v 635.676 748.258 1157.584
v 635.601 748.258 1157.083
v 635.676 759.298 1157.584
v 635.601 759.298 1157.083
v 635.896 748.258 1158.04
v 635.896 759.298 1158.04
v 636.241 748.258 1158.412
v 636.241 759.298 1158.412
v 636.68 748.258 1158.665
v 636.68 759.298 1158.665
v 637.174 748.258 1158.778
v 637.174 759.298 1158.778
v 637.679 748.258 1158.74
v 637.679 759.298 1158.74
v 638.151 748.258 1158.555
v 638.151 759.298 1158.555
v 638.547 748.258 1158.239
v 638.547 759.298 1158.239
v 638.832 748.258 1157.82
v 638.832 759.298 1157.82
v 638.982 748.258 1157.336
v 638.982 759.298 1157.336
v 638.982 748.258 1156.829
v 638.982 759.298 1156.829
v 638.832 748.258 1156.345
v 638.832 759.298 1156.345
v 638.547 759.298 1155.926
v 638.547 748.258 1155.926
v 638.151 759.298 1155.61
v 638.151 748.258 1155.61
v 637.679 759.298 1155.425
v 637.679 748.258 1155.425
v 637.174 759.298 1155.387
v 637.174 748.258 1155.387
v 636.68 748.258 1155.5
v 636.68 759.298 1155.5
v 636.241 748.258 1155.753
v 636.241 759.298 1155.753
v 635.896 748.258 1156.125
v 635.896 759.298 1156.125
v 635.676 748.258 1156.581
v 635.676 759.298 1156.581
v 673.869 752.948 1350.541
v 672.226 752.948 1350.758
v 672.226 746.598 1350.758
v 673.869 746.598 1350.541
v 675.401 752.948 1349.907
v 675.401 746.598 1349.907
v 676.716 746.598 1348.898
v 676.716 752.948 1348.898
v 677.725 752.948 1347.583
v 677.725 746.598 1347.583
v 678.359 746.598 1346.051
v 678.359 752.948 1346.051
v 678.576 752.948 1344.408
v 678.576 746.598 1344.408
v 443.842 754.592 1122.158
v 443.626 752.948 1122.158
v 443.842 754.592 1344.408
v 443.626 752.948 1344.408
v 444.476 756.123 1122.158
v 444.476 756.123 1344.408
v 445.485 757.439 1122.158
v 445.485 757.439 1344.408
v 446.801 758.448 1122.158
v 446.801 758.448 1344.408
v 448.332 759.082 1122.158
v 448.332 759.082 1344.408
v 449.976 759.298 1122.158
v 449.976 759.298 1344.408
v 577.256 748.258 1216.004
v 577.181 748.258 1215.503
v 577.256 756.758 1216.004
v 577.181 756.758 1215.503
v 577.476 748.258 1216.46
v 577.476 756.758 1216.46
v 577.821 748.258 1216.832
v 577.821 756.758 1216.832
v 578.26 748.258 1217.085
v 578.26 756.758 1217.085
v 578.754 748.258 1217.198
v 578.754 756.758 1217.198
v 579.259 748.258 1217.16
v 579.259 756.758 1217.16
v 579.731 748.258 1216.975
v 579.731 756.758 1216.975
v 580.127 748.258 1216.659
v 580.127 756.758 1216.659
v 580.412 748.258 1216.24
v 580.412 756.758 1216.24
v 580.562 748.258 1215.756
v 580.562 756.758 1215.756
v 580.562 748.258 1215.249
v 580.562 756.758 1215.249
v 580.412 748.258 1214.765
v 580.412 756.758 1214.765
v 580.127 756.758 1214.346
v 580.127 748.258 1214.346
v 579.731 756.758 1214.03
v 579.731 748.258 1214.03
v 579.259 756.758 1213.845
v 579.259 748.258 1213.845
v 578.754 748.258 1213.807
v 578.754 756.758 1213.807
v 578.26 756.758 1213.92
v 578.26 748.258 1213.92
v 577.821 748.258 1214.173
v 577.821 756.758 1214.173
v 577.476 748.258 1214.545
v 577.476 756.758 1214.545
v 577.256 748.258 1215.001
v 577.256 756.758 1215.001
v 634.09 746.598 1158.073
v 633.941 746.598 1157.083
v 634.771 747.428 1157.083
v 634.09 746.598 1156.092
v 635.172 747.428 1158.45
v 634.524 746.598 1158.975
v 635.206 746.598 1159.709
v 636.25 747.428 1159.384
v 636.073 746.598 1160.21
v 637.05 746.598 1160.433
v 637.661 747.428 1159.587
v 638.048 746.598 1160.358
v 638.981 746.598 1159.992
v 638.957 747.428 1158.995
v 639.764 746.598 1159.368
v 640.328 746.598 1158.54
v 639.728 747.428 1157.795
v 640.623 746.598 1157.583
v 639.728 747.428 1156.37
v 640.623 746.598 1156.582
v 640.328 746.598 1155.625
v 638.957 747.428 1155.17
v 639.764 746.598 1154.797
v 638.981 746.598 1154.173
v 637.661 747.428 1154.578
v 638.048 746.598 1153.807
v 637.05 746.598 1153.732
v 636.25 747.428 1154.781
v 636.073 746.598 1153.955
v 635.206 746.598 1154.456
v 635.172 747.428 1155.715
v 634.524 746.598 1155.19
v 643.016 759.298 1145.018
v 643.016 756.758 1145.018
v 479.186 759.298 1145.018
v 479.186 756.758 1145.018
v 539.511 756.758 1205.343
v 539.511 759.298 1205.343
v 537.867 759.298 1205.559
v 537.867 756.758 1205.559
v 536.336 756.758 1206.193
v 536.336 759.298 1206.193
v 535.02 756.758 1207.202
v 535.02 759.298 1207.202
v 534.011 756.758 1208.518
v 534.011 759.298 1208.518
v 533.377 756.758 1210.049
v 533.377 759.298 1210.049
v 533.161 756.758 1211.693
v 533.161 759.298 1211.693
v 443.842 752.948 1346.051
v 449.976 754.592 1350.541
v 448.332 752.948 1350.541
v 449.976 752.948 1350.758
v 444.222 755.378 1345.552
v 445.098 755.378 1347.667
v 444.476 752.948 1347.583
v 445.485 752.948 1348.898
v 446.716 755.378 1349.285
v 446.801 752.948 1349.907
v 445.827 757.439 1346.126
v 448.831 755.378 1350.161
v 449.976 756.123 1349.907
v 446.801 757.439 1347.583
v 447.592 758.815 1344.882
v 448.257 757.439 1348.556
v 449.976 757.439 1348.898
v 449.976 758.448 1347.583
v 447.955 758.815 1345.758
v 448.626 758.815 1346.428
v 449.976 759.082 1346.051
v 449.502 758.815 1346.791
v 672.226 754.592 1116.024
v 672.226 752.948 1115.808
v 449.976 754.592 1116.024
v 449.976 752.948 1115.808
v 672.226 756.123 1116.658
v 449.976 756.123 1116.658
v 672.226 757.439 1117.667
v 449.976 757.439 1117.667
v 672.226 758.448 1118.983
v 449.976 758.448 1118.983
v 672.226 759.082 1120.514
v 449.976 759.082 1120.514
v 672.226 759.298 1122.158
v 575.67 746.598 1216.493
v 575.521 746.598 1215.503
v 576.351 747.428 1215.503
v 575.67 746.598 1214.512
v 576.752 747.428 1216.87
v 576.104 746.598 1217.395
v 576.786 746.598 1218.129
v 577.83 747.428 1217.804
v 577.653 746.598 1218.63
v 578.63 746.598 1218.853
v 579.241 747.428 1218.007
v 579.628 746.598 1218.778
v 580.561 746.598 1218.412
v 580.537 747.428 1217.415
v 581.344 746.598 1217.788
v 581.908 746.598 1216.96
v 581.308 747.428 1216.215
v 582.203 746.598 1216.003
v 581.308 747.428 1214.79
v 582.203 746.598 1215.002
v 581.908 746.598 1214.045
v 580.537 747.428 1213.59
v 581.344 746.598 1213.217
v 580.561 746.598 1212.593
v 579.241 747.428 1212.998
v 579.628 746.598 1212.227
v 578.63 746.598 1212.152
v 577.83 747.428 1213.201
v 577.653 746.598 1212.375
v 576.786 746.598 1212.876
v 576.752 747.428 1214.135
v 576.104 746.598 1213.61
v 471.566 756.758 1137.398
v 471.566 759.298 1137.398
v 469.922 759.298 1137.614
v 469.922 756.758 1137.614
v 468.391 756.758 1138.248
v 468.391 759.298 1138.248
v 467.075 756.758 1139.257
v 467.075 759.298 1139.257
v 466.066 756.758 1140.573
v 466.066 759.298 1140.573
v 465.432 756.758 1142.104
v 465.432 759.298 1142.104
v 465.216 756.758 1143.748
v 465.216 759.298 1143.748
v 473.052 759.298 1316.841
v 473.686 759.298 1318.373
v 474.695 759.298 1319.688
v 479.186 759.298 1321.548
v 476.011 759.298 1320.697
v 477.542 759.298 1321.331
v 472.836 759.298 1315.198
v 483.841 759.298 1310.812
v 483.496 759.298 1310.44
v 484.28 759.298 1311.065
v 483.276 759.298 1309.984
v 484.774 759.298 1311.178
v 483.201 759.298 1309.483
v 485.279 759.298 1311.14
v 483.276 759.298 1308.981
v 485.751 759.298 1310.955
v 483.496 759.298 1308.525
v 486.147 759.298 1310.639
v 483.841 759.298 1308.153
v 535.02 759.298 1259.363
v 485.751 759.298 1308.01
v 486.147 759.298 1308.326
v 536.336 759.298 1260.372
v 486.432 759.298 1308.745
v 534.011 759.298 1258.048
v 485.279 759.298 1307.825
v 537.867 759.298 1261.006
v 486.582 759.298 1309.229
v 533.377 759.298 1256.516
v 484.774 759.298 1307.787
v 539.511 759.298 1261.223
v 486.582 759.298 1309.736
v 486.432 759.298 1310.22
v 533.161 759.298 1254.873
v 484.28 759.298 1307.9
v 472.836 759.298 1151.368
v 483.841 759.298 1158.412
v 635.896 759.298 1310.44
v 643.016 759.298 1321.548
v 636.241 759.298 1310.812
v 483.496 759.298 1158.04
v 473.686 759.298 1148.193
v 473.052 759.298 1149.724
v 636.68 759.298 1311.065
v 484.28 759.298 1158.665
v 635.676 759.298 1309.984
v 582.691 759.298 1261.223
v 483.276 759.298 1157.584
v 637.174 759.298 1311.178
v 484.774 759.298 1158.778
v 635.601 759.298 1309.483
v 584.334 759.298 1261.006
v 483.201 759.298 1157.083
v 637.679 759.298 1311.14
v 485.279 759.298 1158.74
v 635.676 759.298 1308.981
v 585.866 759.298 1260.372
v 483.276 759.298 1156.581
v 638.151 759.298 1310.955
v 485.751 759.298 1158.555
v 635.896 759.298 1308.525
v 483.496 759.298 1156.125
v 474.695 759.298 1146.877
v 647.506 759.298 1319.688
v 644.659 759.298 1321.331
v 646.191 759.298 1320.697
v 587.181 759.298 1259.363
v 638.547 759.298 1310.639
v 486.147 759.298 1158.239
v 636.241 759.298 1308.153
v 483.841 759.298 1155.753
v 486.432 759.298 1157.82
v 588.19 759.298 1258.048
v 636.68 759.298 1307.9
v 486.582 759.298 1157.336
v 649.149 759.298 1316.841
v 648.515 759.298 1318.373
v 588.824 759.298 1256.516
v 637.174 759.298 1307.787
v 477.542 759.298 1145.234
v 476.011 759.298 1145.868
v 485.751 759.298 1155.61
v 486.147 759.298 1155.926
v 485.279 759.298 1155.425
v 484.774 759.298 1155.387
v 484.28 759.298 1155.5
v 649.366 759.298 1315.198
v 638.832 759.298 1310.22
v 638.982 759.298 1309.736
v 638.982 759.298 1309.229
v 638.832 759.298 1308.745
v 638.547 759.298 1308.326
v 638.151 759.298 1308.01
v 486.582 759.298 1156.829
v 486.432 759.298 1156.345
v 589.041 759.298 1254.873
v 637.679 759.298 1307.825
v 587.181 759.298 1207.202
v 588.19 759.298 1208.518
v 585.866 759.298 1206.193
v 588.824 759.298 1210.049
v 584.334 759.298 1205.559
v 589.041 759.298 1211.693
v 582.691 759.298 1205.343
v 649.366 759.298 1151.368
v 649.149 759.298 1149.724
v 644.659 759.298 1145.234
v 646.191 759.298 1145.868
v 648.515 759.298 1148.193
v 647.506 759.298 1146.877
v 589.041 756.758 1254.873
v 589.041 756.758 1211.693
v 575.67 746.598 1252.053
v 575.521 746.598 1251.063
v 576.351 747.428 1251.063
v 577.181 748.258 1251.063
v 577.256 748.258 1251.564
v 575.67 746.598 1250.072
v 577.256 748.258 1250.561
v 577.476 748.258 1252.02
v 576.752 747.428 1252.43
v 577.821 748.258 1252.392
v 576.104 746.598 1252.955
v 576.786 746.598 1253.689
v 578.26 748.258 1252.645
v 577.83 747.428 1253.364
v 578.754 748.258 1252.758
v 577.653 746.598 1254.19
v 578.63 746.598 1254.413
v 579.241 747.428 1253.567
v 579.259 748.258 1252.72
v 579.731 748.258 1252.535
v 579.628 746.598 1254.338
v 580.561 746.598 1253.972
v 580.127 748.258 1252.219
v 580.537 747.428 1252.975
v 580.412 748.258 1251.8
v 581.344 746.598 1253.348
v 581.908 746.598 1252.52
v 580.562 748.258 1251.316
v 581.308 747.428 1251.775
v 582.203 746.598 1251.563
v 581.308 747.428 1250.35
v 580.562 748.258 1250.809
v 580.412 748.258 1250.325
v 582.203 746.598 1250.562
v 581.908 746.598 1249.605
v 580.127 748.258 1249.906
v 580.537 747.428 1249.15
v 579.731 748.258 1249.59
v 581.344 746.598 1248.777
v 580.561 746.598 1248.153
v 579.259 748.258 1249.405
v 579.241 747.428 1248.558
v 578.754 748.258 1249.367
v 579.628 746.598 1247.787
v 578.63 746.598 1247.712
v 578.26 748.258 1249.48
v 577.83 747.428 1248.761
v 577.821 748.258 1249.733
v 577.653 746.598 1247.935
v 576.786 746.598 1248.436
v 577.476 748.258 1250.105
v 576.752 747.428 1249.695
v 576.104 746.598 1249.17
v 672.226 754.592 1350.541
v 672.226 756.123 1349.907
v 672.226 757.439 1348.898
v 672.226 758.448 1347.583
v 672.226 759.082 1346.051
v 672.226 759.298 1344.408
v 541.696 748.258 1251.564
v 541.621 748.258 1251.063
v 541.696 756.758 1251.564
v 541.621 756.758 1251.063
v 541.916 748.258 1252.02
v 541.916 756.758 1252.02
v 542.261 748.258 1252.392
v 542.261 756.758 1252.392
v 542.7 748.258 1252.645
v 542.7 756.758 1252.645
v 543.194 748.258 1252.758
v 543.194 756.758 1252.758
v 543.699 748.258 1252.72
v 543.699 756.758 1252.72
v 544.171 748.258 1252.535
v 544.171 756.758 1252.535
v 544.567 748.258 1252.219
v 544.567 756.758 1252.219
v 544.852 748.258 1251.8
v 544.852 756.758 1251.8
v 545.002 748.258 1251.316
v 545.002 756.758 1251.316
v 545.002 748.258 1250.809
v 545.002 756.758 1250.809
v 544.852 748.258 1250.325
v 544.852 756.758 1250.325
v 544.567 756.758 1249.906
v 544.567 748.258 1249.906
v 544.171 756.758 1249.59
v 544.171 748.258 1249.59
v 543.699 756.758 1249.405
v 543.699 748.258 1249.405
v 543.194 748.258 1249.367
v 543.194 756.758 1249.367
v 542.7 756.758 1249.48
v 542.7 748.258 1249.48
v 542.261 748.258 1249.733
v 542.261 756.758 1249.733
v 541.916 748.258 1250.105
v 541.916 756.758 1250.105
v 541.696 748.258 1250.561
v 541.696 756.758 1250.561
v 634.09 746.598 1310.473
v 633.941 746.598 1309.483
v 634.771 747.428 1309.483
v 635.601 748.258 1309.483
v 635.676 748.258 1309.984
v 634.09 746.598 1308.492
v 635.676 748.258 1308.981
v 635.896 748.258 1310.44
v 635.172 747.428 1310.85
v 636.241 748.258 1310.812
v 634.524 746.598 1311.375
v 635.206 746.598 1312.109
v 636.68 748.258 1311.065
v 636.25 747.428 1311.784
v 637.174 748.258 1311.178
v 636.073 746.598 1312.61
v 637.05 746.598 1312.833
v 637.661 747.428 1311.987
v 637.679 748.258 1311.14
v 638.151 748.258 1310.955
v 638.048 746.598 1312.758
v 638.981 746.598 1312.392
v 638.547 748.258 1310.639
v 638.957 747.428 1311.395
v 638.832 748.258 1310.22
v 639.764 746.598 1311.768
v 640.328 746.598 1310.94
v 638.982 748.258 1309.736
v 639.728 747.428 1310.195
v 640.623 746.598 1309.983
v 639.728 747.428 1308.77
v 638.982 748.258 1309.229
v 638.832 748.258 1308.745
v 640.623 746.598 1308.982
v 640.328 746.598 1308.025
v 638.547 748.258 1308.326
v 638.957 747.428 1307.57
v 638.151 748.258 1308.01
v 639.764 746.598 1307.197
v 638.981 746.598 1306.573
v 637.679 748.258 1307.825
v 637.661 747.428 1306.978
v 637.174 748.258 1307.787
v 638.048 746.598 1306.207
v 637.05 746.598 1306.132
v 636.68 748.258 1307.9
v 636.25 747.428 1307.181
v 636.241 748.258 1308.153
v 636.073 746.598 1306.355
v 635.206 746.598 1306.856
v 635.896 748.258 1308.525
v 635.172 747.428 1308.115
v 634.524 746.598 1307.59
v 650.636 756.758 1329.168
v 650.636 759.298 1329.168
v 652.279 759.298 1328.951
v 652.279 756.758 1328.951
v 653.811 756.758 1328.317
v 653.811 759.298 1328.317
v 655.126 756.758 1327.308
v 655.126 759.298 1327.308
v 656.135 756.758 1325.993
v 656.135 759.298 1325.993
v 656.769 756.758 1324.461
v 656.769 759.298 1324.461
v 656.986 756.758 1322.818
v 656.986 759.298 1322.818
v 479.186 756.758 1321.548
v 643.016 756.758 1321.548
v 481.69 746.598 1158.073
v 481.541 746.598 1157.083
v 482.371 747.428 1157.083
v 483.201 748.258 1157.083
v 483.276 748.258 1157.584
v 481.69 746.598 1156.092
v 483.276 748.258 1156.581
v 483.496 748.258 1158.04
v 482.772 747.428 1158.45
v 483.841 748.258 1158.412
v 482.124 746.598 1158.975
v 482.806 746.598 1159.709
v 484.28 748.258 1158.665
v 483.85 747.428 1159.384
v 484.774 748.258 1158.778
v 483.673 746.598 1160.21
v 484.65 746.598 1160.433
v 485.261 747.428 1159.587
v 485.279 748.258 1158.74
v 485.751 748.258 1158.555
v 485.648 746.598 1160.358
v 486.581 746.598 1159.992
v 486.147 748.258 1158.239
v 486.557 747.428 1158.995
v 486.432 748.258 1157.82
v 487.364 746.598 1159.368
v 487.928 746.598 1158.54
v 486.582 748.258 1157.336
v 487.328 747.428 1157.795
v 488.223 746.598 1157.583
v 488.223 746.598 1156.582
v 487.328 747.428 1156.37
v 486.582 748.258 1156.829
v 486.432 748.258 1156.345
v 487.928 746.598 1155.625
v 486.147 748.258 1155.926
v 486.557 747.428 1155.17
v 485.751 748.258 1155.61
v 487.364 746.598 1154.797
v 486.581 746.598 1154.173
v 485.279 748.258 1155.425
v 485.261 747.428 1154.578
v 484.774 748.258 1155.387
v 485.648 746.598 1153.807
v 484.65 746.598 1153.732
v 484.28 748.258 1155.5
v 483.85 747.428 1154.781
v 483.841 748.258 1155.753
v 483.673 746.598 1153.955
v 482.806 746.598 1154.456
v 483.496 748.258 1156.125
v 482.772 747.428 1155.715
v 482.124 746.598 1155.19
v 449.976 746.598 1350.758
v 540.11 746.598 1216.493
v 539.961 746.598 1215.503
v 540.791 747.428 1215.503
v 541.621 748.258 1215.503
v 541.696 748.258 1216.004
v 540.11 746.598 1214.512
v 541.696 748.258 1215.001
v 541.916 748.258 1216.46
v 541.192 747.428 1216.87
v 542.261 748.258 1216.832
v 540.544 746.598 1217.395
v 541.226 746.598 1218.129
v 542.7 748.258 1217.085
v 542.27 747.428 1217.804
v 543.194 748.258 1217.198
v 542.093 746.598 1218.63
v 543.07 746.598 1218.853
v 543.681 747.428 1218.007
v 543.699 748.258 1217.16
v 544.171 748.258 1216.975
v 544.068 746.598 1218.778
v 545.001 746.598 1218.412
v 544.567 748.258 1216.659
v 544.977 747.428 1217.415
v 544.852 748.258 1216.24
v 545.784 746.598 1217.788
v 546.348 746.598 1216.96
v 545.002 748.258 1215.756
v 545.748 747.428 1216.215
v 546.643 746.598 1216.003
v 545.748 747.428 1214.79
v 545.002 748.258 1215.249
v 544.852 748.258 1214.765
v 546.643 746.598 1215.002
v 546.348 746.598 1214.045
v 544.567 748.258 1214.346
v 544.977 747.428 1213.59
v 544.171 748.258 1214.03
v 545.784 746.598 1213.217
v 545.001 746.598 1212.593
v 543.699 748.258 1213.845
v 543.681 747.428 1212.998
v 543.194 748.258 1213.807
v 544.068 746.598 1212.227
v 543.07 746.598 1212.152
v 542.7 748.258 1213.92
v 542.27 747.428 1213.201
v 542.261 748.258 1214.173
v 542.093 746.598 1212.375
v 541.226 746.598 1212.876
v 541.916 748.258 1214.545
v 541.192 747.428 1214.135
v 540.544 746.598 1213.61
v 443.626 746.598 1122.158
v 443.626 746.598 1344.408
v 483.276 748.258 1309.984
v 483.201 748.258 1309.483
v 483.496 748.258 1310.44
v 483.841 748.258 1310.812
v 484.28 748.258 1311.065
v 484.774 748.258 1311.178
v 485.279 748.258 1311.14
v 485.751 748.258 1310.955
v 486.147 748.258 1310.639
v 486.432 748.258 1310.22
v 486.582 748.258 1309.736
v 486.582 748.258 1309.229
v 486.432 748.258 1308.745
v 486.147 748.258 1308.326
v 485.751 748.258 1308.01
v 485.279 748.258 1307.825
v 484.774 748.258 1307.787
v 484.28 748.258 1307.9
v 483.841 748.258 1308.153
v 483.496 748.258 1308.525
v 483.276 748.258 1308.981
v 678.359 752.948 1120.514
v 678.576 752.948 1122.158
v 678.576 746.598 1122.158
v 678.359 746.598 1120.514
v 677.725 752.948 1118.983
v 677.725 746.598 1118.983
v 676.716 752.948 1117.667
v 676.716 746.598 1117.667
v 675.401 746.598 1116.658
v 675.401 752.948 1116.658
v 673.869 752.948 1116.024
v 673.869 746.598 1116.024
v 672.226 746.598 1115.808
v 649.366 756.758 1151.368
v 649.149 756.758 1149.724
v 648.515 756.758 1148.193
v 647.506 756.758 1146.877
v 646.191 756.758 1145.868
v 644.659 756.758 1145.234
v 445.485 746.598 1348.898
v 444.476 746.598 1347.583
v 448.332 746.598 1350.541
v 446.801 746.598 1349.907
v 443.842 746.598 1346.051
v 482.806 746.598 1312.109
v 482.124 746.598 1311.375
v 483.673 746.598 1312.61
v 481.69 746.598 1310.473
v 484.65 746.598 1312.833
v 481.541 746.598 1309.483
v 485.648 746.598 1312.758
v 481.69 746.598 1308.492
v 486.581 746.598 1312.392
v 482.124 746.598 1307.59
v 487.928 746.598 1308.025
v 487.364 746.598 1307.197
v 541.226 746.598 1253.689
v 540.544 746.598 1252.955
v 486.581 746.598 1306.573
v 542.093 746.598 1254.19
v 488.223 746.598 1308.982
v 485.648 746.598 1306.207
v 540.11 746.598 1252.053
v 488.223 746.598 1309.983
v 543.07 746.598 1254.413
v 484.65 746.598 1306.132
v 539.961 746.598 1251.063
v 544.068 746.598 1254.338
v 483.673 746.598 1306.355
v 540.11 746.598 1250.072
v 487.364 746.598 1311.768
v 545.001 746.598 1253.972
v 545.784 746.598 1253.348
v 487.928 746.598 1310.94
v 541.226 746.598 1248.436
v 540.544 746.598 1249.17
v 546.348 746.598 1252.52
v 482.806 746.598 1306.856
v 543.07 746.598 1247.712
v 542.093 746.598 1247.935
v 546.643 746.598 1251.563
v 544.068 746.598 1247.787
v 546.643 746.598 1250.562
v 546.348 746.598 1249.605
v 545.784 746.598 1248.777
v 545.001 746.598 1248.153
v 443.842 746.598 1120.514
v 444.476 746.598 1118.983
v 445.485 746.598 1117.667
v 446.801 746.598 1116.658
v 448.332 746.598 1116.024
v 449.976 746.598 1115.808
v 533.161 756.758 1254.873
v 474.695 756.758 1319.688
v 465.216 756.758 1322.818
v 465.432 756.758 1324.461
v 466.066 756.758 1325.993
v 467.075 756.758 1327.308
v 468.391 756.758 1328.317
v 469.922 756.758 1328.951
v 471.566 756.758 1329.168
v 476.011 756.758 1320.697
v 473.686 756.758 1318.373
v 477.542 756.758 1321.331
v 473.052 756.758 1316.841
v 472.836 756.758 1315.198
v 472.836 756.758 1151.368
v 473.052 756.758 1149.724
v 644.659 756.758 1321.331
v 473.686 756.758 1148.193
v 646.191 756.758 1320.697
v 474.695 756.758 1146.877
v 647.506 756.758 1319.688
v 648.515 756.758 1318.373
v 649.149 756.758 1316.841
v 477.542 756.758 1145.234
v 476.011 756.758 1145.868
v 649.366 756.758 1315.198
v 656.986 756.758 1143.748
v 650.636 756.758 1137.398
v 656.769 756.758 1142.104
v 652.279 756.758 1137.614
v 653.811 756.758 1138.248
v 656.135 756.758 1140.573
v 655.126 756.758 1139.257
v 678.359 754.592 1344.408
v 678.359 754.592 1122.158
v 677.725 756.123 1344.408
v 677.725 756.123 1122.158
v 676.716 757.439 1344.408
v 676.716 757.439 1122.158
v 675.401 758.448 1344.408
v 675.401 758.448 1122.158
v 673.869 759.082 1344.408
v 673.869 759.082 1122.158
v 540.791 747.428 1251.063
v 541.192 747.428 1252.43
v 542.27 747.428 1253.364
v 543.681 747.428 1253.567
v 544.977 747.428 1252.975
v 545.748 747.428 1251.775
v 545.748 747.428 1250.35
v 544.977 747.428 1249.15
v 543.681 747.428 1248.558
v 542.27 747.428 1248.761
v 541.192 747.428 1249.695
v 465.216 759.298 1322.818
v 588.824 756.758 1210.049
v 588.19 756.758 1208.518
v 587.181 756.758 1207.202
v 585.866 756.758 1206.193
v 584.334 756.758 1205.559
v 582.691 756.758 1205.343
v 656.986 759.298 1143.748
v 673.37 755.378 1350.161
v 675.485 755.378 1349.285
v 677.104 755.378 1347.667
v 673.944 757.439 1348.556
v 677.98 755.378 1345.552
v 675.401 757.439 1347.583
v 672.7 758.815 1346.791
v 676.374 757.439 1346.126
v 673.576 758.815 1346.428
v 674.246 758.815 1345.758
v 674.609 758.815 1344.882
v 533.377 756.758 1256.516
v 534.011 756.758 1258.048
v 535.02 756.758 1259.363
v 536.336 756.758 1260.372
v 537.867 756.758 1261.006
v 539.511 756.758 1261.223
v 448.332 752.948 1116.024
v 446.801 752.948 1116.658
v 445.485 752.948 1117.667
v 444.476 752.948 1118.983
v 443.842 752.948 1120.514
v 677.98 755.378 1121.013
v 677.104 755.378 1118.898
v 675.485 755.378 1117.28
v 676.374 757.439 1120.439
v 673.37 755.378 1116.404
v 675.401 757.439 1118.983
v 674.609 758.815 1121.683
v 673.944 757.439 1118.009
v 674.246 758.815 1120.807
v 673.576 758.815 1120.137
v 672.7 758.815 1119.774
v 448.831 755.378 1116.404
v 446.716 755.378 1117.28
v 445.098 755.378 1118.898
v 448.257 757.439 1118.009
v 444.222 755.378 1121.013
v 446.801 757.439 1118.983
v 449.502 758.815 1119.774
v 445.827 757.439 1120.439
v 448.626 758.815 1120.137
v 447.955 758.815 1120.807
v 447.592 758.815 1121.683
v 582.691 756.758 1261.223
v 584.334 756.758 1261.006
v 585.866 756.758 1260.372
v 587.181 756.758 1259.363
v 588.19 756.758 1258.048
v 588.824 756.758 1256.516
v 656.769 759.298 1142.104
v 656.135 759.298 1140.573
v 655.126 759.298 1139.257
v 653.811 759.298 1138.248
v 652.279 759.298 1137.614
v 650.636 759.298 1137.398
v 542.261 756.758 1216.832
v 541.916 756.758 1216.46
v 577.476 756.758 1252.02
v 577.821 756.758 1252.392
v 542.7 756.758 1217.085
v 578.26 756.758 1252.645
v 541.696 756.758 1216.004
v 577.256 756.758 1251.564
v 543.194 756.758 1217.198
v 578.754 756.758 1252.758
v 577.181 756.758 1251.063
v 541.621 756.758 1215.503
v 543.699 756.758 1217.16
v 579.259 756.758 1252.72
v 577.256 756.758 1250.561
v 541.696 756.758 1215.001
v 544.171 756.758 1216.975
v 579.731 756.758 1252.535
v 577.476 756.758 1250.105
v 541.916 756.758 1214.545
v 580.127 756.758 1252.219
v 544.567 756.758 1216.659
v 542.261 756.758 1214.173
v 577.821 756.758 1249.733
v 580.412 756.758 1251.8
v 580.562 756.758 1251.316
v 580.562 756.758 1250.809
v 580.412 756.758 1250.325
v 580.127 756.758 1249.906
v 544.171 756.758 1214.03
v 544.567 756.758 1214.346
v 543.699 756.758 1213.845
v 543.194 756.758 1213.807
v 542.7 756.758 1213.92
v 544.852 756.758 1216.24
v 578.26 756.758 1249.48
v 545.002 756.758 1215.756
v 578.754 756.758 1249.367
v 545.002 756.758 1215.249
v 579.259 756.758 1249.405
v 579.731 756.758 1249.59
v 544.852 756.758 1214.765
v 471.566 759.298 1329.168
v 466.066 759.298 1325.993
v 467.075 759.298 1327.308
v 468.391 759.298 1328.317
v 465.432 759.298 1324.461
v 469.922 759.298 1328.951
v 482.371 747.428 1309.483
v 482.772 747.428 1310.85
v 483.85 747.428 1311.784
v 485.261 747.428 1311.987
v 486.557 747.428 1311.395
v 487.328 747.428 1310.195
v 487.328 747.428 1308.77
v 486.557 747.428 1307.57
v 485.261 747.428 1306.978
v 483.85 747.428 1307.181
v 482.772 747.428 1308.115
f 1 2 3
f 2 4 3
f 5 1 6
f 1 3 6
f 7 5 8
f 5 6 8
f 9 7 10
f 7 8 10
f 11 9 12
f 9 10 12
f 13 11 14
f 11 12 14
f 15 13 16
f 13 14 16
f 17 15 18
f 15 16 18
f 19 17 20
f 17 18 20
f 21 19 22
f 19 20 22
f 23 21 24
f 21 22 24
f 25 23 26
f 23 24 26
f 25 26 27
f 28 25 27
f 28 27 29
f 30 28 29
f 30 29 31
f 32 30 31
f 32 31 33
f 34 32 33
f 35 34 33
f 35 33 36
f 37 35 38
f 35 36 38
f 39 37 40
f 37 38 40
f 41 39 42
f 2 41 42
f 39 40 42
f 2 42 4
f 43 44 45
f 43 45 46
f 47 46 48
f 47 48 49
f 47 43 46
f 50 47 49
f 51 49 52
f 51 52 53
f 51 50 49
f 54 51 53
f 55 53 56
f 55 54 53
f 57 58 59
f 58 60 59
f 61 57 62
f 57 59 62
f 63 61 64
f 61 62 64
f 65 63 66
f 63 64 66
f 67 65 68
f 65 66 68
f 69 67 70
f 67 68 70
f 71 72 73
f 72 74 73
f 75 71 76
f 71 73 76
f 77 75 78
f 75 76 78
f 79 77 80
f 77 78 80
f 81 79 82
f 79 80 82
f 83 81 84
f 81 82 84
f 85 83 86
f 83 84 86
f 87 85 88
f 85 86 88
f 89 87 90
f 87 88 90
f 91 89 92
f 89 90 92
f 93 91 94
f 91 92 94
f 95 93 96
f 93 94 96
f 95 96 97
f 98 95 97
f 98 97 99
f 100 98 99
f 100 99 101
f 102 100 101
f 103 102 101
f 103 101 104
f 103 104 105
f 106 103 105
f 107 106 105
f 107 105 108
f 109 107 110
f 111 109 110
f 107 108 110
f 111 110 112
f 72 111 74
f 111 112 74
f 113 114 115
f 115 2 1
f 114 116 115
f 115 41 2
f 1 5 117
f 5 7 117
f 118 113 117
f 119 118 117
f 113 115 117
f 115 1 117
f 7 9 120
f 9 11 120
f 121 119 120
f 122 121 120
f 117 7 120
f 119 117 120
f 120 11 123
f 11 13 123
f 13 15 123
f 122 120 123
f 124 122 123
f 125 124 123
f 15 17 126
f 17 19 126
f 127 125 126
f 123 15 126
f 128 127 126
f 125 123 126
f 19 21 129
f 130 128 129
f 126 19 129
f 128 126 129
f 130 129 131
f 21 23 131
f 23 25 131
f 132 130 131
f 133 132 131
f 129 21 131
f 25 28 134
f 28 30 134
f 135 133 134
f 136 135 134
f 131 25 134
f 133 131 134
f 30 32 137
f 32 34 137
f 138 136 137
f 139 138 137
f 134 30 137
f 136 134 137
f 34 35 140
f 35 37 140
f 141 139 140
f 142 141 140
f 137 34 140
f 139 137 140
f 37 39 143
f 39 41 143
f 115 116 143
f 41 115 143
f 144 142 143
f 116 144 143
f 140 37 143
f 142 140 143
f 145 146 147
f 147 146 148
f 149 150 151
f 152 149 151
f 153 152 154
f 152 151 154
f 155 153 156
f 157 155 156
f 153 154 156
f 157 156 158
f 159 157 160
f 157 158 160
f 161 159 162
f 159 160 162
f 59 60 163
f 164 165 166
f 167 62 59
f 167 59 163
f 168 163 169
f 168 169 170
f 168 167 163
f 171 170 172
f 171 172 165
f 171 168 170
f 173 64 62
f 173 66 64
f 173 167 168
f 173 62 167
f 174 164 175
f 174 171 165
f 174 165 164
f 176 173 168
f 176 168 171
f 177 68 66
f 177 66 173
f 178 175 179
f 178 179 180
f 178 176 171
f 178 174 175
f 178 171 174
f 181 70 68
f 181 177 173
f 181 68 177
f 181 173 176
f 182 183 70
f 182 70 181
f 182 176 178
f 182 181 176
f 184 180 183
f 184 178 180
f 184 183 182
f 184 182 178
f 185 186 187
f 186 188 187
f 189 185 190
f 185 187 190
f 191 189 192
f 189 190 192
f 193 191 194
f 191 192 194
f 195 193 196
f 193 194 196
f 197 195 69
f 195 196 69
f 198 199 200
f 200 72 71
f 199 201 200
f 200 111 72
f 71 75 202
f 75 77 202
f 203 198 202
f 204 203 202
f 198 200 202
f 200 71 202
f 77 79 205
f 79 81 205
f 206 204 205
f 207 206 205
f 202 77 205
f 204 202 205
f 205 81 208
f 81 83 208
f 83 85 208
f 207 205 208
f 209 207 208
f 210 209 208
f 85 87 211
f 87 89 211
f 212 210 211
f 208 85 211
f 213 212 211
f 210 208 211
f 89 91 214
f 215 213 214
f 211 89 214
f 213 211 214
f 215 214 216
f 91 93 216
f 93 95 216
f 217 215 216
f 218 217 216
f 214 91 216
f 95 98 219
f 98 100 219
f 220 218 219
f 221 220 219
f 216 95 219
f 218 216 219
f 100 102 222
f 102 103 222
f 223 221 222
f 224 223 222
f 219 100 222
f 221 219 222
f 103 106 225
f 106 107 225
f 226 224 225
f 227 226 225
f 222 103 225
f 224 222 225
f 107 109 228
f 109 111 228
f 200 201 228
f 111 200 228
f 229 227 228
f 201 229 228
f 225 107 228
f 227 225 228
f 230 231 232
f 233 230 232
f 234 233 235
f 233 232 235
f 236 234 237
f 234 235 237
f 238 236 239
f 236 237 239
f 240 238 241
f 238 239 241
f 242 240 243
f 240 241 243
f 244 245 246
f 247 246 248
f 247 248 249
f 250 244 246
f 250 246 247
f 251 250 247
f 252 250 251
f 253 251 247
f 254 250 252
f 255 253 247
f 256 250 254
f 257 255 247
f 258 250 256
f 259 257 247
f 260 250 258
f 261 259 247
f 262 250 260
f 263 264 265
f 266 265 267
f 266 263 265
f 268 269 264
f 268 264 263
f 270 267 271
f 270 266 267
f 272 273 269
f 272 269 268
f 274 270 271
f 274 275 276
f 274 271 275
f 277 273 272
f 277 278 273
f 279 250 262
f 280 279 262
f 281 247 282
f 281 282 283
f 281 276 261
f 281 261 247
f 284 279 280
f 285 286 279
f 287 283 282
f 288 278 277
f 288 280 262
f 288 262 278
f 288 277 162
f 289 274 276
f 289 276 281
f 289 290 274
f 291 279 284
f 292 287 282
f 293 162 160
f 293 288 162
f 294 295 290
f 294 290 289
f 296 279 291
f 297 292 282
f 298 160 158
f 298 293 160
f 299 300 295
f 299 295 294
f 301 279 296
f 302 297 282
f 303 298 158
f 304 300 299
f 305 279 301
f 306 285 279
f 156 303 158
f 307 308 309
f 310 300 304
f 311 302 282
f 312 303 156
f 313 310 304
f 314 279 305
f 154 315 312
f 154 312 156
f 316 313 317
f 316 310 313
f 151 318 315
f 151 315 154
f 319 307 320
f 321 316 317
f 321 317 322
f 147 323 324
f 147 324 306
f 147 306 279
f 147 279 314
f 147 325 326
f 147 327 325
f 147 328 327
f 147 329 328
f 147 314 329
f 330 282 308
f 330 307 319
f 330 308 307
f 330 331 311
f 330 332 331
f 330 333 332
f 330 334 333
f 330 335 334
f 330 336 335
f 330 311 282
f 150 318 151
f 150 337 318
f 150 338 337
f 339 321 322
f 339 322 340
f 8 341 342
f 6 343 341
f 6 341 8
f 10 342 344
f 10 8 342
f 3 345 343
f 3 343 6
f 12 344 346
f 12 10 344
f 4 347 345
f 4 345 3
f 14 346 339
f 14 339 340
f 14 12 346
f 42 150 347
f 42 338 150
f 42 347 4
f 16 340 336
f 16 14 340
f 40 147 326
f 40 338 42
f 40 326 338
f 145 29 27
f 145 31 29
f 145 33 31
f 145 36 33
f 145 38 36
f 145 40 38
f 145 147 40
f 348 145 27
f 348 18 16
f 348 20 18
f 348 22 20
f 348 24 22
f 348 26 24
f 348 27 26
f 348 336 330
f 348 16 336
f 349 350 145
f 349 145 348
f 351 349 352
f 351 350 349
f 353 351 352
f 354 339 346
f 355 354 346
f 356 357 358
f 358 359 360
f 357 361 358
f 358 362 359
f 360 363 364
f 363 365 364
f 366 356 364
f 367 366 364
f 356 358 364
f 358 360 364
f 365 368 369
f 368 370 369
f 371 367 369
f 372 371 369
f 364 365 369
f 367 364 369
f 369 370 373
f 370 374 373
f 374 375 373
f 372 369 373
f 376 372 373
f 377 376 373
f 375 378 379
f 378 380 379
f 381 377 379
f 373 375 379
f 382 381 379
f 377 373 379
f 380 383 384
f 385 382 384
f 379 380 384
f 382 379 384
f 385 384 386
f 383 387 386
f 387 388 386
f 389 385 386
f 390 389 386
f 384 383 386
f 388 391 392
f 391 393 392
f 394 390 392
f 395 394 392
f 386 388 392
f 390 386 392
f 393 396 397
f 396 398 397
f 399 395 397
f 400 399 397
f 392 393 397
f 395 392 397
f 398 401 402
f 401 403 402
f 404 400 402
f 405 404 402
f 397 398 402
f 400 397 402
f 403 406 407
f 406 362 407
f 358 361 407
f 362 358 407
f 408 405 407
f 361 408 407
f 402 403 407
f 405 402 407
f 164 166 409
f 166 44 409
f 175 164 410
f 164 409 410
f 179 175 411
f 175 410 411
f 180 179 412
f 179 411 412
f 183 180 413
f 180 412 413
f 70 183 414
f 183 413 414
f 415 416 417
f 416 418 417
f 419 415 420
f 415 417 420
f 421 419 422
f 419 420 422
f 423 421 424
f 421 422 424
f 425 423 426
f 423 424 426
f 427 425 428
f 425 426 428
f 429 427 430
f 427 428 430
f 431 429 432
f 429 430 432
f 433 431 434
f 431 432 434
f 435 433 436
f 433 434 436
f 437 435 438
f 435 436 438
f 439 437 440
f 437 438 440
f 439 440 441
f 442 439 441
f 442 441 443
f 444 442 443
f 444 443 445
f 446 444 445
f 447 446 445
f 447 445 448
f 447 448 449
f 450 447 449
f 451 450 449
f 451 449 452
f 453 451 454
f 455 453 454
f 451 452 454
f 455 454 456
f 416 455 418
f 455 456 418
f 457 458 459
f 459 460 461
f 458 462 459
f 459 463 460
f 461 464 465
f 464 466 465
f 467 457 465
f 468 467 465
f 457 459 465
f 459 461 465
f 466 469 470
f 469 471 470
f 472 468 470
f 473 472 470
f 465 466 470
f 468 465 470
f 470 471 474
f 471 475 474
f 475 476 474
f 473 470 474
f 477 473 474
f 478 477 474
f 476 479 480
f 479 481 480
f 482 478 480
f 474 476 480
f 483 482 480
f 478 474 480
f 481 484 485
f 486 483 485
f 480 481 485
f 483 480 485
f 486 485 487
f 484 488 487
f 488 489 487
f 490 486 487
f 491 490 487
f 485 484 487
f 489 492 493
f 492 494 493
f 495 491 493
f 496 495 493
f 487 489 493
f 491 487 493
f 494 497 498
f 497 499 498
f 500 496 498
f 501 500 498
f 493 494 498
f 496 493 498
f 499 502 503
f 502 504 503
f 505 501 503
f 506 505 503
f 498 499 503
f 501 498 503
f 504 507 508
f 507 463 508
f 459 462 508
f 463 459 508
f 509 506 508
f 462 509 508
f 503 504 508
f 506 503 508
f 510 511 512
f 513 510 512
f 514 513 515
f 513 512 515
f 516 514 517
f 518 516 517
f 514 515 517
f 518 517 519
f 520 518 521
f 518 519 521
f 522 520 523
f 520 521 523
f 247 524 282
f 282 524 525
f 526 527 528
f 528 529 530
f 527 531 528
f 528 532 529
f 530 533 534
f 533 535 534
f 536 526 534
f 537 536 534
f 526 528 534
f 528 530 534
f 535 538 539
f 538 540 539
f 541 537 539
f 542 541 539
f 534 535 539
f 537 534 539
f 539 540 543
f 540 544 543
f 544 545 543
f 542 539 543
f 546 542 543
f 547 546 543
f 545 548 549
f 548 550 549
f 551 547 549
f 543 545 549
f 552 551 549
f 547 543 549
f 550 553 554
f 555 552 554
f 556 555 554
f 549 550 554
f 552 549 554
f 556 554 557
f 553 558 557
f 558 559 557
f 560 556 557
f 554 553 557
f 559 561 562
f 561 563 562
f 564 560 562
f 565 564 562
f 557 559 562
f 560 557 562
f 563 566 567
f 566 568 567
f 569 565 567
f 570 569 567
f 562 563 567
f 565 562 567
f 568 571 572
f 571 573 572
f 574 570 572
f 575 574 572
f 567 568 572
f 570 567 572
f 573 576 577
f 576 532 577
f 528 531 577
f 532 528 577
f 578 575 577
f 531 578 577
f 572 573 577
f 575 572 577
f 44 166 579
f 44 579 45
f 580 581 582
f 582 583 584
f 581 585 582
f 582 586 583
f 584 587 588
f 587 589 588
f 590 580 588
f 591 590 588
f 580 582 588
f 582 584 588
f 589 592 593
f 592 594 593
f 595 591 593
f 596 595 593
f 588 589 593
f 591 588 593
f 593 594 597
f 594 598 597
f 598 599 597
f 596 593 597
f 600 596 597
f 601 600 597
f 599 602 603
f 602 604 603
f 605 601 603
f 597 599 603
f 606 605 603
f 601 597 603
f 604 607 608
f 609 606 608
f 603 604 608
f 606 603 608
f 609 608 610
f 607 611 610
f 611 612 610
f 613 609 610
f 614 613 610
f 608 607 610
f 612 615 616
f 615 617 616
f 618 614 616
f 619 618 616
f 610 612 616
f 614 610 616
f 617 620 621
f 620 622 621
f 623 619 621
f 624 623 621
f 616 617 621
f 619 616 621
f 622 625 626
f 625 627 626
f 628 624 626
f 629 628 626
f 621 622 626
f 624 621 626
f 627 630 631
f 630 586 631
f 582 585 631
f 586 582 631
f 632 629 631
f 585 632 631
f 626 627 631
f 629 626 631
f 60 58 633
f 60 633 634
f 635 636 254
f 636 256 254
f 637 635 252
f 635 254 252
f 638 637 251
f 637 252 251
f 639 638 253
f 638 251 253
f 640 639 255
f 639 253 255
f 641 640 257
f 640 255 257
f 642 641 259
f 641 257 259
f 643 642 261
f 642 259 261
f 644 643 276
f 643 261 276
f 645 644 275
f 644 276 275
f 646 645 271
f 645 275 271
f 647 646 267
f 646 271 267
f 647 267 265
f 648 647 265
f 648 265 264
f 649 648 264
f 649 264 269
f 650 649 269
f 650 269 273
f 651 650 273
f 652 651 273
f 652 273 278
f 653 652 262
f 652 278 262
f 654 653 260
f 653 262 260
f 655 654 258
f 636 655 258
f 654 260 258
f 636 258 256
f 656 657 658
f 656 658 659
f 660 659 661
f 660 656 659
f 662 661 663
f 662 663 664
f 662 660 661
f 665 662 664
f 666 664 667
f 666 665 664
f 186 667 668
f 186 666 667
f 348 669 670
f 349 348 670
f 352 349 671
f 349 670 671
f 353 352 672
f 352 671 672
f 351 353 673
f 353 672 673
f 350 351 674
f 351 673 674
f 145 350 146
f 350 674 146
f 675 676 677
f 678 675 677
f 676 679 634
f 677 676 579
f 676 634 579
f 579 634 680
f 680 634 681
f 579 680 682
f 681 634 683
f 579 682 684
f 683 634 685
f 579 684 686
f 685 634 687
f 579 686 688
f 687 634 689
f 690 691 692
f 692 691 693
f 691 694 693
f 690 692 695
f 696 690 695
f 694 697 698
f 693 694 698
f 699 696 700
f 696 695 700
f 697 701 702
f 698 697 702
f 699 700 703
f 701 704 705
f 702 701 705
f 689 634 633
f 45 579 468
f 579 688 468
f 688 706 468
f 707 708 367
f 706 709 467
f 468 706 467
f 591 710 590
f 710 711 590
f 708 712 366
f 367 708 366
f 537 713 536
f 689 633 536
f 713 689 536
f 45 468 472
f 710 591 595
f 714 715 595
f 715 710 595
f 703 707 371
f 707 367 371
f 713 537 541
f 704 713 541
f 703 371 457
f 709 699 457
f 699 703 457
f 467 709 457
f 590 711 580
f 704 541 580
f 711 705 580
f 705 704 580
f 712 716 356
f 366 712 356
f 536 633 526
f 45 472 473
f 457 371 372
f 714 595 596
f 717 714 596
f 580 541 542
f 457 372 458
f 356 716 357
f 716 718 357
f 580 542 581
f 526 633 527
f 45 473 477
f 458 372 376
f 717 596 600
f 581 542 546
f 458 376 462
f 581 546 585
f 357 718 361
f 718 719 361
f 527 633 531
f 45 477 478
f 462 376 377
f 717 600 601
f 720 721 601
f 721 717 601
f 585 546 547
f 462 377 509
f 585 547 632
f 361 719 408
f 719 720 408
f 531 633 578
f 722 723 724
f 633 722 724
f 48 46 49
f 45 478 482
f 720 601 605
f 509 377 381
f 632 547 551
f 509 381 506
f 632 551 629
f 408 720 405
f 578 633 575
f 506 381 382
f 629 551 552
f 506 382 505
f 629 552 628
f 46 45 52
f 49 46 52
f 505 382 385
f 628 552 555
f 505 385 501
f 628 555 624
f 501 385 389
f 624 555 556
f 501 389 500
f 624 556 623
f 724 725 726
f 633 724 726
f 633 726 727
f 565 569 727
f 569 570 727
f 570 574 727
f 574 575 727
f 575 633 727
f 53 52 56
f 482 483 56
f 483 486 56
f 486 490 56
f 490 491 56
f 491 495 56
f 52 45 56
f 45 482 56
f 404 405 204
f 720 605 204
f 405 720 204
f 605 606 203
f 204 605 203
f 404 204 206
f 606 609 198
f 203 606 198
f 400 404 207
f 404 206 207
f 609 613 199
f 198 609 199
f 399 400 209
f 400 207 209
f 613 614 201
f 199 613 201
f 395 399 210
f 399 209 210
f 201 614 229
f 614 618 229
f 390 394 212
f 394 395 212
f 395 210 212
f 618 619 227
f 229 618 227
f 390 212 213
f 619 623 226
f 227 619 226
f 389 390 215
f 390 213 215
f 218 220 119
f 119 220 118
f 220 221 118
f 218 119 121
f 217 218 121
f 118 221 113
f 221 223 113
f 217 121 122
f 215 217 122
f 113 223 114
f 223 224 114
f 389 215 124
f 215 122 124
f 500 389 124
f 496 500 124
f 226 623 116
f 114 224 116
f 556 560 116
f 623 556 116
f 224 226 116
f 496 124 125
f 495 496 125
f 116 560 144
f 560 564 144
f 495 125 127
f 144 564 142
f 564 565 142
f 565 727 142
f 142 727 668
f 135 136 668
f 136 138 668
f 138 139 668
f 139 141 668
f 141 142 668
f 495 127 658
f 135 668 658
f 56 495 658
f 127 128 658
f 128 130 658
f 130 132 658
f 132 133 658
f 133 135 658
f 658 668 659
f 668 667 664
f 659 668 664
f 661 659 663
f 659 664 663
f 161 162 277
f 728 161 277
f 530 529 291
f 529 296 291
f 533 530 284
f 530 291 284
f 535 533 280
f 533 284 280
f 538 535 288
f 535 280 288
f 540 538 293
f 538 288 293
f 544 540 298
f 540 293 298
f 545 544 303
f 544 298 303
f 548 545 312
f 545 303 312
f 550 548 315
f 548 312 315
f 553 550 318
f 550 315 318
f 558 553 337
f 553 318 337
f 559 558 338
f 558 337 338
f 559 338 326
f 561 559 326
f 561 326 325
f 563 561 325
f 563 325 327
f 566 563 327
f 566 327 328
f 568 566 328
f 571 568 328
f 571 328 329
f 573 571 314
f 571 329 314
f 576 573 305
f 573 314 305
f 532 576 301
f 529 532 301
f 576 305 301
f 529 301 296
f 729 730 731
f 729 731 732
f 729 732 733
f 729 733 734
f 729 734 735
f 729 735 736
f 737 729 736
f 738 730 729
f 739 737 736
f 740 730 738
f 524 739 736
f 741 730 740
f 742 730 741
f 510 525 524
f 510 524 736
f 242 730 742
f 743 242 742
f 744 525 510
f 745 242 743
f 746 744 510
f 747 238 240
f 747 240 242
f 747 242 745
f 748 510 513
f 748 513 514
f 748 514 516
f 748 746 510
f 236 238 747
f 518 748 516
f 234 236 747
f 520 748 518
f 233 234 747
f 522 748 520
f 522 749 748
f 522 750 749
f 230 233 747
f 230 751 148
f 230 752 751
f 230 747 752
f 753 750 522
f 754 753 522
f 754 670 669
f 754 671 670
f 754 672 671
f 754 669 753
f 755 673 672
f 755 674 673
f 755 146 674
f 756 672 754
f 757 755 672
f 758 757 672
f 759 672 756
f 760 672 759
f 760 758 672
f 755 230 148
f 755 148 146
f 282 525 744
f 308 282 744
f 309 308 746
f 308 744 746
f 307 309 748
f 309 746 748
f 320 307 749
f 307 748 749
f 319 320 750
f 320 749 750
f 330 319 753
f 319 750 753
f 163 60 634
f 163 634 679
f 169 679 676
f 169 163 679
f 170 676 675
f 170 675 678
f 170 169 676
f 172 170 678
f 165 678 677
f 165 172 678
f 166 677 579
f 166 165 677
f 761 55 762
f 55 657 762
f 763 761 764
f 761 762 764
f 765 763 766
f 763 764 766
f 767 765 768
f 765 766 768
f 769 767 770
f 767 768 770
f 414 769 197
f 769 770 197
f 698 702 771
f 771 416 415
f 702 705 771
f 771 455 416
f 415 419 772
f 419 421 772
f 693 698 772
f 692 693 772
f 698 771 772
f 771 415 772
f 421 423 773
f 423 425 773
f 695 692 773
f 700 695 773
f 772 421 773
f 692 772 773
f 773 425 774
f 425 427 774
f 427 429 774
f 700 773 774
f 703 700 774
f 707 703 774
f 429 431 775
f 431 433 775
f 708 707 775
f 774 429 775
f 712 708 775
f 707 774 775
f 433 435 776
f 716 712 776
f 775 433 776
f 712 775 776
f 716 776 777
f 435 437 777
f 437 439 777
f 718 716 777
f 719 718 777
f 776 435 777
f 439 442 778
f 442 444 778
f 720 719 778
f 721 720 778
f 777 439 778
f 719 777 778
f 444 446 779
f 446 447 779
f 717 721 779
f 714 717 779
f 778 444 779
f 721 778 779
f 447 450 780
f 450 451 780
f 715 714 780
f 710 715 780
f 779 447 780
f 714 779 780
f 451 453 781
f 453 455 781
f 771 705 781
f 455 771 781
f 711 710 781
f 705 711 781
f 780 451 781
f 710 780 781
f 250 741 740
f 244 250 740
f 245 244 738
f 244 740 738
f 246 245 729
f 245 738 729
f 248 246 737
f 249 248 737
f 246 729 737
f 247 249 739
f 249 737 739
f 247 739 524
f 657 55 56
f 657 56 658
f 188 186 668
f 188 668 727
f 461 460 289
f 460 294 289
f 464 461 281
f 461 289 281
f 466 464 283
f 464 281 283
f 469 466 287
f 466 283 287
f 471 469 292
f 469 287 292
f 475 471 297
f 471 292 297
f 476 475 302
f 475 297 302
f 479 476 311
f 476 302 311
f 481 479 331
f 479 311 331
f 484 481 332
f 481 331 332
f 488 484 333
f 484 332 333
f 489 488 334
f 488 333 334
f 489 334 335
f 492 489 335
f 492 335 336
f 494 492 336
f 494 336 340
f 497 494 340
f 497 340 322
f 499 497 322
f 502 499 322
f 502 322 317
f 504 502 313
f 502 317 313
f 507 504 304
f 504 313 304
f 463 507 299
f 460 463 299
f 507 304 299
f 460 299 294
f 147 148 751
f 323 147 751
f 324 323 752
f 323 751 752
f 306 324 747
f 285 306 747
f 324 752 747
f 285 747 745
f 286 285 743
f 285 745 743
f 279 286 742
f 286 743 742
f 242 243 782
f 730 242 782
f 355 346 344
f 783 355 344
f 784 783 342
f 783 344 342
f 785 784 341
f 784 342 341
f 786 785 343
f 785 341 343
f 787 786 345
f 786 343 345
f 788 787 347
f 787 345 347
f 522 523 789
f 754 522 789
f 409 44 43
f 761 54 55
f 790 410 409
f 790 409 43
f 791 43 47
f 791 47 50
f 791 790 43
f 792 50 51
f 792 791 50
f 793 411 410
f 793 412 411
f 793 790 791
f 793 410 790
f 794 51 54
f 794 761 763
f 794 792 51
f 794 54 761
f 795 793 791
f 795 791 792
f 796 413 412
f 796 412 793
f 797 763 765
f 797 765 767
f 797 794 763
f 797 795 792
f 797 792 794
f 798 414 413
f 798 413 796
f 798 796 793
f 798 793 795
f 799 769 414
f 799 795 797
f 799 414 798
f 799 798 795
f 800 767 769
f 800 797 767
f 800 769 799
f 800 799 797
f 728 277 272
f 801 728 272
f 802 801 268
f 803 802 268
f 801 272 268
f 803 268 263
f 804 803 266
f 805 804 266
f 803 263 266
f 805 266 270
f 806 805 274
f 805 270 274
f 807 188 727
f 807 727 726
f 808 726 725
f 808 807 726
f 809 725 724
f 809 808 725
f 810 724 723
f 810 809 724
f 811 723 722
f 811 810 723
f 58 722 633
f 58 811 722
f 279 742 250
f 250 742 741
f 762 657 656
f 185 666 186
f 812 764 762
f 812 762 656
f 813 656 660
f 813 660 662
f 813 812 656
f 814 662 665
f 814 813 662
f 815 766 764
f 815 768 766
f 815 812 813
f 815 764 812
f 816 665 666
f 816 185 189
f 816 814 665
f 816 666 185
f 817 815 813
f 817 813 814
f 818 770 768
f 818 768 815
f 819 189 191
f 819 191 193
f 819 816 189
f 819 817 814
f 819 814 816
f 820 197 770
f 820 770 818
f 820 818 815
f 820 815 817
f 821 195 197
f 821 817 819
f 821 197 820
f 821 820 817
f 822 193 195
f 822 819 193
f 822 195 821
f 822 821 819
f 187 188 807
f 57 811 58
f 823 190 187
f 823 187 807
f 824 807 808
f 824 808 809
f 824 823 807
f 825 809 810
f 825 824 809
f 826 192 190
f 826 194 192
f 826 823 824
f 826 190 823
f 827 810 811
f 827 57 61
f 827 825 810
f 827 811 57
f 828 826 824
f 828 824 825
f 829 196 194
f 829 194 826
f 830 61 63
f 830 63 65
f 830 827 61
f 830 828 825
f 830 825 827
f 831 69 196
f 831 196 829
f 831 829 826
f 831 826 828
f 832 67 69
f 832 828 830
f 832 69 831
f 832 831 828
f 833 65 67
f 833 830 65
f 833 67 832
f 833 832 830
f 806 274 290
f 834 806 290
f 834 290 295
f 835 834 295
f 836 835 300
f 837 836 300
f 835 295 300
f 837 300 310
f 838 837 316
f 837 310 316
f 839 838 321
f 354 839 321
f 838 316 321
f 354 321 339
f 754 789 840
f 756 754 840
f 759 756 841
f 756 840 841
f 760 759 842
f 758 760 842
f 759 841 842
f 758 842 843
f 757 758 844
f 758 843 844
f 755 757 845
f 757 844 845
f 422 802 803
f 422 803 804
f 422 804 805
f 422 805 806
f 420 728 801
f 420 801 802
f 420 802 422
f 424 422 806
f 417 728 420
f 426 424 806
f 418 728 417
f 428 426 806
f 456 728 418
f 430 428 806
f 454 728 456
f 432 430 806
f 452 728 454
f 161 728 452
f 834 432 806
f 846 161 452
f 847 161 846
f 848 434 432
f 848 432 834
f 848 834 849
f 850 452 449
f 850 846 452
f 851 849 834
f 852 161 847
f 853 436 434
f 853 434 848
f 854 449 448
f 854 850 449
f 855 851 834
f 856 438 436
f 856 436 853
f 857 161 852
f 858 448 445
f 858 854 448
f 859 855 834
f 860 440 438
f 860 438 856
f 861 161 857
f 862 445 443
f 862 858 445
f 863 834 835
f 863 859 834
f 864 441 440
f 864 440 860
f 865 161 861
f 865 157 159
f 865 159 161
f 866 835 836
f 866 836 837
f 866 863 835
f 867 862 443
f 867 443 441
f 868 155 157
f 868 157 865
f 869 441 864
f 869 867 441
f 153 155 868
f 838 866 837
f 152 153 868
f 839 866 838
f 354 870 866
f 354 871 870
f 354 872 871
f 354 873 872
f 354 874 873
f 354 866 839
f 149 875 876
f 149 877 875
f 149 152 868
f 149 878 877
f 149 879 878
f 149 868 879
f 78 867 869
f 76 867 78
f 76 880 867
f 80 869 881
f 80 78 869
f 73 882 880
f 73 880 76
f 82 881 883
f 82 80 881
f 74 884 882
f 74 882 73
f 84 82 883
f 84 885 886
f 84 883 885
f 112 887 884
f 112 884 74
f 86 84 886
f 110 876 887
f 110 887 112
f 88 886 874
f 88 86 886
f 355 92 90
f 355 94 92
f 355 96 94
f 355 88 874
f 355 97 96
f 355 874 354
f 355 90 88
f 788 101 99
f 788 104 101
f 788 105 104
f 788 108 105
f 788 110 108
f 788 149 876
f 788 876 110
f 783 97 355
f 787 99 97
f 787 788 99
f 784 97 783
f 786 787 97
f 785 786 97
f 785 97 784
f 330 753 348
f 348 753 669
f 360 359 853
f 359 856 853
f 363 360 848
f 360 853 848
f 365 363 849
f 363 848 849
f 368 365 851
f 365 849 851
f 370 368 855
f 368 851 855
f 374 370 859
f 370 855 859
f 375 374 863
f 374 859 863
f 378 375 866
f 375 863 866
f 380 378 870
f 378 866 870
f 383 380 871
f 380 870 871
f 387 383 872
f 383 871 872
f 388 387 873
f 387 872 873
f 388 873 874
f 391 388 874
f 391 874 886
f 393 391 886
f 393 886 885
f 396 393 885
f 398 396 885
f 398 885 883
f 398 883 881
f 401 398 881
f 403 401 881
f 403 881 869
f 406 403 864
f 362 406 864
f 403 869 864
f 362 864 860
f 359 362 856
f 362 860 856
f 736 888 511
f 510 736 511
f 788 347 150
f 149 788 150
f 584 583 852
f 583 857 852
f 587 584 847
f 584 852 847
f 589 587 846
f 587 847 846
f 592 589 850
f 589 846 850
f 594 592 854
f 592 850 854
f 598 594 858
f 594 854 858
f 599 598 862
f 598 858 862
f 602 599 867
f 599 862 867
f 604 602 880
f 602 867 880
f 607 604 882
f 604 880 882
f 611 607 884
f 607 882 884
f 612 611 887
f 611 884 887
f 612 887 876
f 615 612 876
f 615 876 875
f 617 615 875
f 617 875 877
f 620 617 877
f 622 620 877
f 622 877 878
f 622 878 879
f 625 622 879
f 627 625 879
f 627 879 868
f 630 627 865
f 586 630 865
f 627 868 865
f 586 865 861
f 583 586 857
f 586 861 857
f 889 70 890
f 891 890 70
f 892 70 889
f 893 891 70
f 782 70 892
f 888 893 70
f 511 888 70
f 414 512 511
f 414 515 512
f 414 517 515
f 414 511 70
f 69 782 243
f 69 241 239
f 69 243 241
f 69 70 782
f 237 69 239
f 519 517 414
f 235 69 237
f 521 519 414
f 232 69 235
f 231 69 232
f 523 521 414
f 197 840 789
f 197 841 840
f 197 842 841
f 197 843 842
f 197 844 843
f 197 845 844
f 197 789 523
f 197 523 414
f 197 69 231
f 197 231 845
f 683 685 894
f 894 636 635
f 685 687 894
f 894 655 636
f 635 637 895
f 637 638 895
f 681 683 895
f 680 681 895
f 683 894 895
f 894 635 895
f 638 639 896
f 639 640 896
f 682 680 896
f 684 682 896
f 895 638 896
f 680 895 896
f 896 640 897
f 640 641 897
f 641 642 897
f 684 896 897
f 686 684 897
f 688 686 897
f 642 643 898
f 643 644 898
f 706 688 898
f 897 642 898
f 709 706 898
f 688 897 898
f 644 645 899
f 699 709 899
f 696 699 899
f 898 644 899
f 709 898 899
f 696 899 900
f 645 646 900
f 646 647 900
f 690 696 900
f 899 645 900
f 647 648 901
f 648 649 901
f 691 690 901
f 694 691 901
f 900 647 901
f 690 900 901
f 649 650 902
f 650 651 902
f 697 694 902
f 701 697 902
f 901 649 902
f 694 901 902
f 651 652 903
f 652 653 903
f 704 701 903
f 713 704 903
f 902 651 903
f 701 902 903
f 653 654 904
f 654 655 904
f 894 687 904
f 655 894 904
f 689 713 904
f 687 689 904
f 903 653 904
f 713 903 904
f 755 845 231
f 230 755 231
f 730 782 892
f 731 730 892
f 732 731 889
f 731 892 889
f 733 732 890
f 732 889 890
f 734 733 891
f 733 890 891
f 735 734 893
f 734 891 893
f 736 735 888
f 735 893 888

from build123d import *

# Parameters (mm, degrees)
BOSS_EXTRUDE1_DEPTH                                  = 12.7
FILLET1_R                                            = 6.35
CUT_EXTRUDE1_DEPTH                                   = 2.54
BOSS_EXTRUDE2_DEPTH                                  = 2.54
CSK_FOR_M3_HEX_SOCKET_COUNTERSUNK_CAP_SC_D           = 3.4
CSK_FOR_M3_HEX_SOCKET_COUNTERSUNK_CAP_SC_CSINK_D     = 6.72
CSK_FOR_M3_HEX_SOCKET_COUNTERSUNK_CAP_SC_CSINK_ANGLE = 90
CUT_EXTRUDE2_DEPTH                                   = 2.54
CSK_FOR_M3_HEX_SOCKET_COUNTERSUNK_CA_2_D             = 3.4
CSK_FOR_M3_HEX_SOCKET_COUNTERSUNK_CA_2_CSINK_D       = 6.72
CSK_FOR_M3_HEX_SOCKET_COUNTERSUNK_CA_2_CSINK_ANGLE   = 90


with BuildPart() as part:
    # Sketch2 → Boss-Extrude1 (new body)
    with BuildSketch(Plane(origin=(0, 759.298436, 0), x_dir=(-1, 0, 0), z_dir=(0, -1, 0))):
        with BuildLine():
            Line((-449.975603201, -1350.757525912), (-672.225603201, -1350.757525912))
            ThreePointArc((-672.225603201, -1350.757525912), (-676.715731261, -1348.897653973), (-678.575603201, -1344.407525912))
            Line((-678.575603201, -1344.407525912), (-678.575603201, -1122.157525912))
            ThreePointArc((-678.575603201, -1122.157525912), (-676.715731261, -1117.667397852), (-672.225603201, -1115.807525912))
            Line((-672.225603201, -1115.807525912), (-449.975603201, -1115.807525912))
            ThreePointArc((-449.975603201, -1115.807525912), (-445.48547514, -1117.667397852), (-443.625603201, -1122.157525912))
            Line((-443.625603201, -1122.157525912), (-443.625603201, -1344.407525912))
            ThreePointArc((-443.625603201, -1344.407525912), (-445.48547514, -1348.897653973), (-449.975603201, -1350.757525912))
        make_face()
    extrude(amount=BOSS_EXTRUDE1_DEPTH)

    # Fillet1
    fillet1_edges = [part.edges().sort_by_distance(p)[0] for p in [
        (678.575603201, 759.298436, 1233.282525912),
        (676.715731261, 759.298436, 1117.667397852),
        (561.100603201, 759.298436, 1115.807525912),
        (445.48547514, 759.298436, 1117.667397852),
        (443.625603201, 759.298436, 1233.282525912),
        (445.48547514, 759.298436, 1348.897653973),
        (561.100603201, 759.298436, 1350.757525912),
        (676.715731261, 759.298436, 1348.897653973),
    ]]
    fillet(fillet1_edges, radius=FILLET1_R)

    # Sketch4 → Cut-Extrude1 (cut)
    with BuildSketch(Plane(origin=(0, 759.298436, 0), x_dir=(1, 0, 0), z_dir=(0, 1, 0))):
        with BuildLine():
            Line((471.565603201, -1329.167525912), (650.635603201, -1329.167525912))
            ThreePointArc((650.635603201, -1329.167525912), (655.125731261, -1327.307653973), (656.985603201, -1322.817525912))
            Line((656.985603201, -1322.817525912), (656.985603201, -1143.747525912))
            ThreePointArc((656.985603201, -1143.747525912), (655.125731261, -1139.257397852), (650.635603201, -1137.397525912))
            Line((650.635603201, -1137.397525912), (471.565603201, -1137.397525912))
            ThreePointArc((471.565603201, -1137.397525912), (467.07547514, -1139.257397852), (465.215603201, -1143.747525912))
            Line((465.215603201, -1143.747525912), (465.215603201, -1322.817525912))
            ThreePointArc((465.215603201, -1322.817525912), (467.07547514, -1327.307653973), (471.565603201, -1329.167525912))
        make_face()
    extrude(amount=-CUT_EXTRUDE1_DEPTH, mode=Mode.SUBTRACT)

    # Sketch5 → Boss-Extrude2 (add)
    with BuildSketch(Plane(origin=(0, 756.758436, 0), x_dir=(1, 0, 0), z_dir=(0, 1, 0))):
        with BuildLine():
            Line((479.185603201, -1321.547525912), (643.015603201, -1321.547525912))
            ThreePointArc((643.015603201, -1321.547525912), (647.505731261, -1319.687653973), (649.365603201, -1315.197525912))
            Line((649.365603201, -1315.197525912), (649.365603201, -1151.367525912))
            ThreePointArc((649.365603201, -1151.367525912), (647.505731261, -1146.877397852), (643.015603201, -1145.017525912))
            Line((643.015603201, -1145.017525912), (479.185603201, -1145.017525912))
            ThreePointArc((479.185603201, -1145.017525912), (474.69547514, -1146.877397852), (472.835603201, -1151.367525912))
            Line((472.835603201, -1151.367525912), (472.835603201, -1315.197525912))
            ThreePointArc((472.835603201, -1315.197525912), (474.69547514, -1319.687653973), (479.185603201, -1321.547525912))
        make_face()
    extrude(amount=BOSS_EXTRUDE2_DEPTH)

    # CSK for M3 Hex Socket Countersunk Cap Sc (through all)
    with Locations(Plane.XZ.offset(-746.598436)):
        with Locations((484.900603201, 1157.082525912), (484.900603201, 1309.482525912), (637.300603201, 1309.482525912), (637.300603201, 1157.082525912)):
            CounterSinkHole(CSK_FOR_M3_HEX_SOCKET_COUNTERSUNK_CAP_SC_D / 2, CSK_FOR_M3_HEX_SOCKET_COUNTERSUNK_CAP_SC_CSINK_D / 2, counter_sink_angle=CSK_FOR_M3_HEX_SOCKET_COUNTERSUNK_CAP_SC_CSINK_ANGLE)

    # Sketch11 → Cut-Extrude2 (cut)
    with BuildSketch(Plane(origin=(0, 759.298436, 0), x_dir=(1, 0, 0), z_dir=(0, 1, 0))):
        with BuildLine():
            Line((539.510603201, -1261.222525912), (582.690603201, -1261.222525912))
            ThreePointArc((582.690603201, -1261.222525912), (587.180731261, -1259.362653973), (589.040603201, -1254.872525912))
            Line((589.040603201, -1254.872525912), (589.040603201, -1211.692525912))
            ThreePointArc((589.040603201, -1211.692525912), (587.180731261, -1207.202397852), (582.690603201, -1205.342525912))
            Line((582.690603201, -1205.342525912), (539.510603201, -1205.342525912))
            ThreePointArc((539.510603201, -1205.342525912), (535.02047514, -1207.202397852), (533.160603201, -1211.692525912))
            Line((533.160603201, -1211.692525912), (533.160603201, -1254.872525912))
            ThreePointArc((533.160603201, -1254.872525912), (535.02047514, -1259.362653973), (539.510603201, -1261.222525912))
        make_face()
    extrude(amount=-CUT_EXTRUDE2_DEPTH, mode=Mode.SUBTRACT)

    # CSK for M3 Hex Socket Countersunk Ca 2 (through all)
    with Locations(Plane.XZ.offset(-746.598436)):
        with Locations((578.880603201, 1215.502525912), (543.320603201, 1215.502525912), (543.320603201, 1251.062525912), (578.880603201, 1251.062525912)):
            CounterSinkHole(CSK_FOR_M3_HEX_SOCKET_COUNTERSUNK_CA_2_D / 2, CSK_FOR_M3_HEX_SOCKET_COUNTERSUNK_CA_2_CSINK_D / 2, counter_sink_angle=CSK_FOR_M3_HEX_SOCKET_COUNTERSUNK_CA_2_CSINK_ANGLE)


solid = part.part
